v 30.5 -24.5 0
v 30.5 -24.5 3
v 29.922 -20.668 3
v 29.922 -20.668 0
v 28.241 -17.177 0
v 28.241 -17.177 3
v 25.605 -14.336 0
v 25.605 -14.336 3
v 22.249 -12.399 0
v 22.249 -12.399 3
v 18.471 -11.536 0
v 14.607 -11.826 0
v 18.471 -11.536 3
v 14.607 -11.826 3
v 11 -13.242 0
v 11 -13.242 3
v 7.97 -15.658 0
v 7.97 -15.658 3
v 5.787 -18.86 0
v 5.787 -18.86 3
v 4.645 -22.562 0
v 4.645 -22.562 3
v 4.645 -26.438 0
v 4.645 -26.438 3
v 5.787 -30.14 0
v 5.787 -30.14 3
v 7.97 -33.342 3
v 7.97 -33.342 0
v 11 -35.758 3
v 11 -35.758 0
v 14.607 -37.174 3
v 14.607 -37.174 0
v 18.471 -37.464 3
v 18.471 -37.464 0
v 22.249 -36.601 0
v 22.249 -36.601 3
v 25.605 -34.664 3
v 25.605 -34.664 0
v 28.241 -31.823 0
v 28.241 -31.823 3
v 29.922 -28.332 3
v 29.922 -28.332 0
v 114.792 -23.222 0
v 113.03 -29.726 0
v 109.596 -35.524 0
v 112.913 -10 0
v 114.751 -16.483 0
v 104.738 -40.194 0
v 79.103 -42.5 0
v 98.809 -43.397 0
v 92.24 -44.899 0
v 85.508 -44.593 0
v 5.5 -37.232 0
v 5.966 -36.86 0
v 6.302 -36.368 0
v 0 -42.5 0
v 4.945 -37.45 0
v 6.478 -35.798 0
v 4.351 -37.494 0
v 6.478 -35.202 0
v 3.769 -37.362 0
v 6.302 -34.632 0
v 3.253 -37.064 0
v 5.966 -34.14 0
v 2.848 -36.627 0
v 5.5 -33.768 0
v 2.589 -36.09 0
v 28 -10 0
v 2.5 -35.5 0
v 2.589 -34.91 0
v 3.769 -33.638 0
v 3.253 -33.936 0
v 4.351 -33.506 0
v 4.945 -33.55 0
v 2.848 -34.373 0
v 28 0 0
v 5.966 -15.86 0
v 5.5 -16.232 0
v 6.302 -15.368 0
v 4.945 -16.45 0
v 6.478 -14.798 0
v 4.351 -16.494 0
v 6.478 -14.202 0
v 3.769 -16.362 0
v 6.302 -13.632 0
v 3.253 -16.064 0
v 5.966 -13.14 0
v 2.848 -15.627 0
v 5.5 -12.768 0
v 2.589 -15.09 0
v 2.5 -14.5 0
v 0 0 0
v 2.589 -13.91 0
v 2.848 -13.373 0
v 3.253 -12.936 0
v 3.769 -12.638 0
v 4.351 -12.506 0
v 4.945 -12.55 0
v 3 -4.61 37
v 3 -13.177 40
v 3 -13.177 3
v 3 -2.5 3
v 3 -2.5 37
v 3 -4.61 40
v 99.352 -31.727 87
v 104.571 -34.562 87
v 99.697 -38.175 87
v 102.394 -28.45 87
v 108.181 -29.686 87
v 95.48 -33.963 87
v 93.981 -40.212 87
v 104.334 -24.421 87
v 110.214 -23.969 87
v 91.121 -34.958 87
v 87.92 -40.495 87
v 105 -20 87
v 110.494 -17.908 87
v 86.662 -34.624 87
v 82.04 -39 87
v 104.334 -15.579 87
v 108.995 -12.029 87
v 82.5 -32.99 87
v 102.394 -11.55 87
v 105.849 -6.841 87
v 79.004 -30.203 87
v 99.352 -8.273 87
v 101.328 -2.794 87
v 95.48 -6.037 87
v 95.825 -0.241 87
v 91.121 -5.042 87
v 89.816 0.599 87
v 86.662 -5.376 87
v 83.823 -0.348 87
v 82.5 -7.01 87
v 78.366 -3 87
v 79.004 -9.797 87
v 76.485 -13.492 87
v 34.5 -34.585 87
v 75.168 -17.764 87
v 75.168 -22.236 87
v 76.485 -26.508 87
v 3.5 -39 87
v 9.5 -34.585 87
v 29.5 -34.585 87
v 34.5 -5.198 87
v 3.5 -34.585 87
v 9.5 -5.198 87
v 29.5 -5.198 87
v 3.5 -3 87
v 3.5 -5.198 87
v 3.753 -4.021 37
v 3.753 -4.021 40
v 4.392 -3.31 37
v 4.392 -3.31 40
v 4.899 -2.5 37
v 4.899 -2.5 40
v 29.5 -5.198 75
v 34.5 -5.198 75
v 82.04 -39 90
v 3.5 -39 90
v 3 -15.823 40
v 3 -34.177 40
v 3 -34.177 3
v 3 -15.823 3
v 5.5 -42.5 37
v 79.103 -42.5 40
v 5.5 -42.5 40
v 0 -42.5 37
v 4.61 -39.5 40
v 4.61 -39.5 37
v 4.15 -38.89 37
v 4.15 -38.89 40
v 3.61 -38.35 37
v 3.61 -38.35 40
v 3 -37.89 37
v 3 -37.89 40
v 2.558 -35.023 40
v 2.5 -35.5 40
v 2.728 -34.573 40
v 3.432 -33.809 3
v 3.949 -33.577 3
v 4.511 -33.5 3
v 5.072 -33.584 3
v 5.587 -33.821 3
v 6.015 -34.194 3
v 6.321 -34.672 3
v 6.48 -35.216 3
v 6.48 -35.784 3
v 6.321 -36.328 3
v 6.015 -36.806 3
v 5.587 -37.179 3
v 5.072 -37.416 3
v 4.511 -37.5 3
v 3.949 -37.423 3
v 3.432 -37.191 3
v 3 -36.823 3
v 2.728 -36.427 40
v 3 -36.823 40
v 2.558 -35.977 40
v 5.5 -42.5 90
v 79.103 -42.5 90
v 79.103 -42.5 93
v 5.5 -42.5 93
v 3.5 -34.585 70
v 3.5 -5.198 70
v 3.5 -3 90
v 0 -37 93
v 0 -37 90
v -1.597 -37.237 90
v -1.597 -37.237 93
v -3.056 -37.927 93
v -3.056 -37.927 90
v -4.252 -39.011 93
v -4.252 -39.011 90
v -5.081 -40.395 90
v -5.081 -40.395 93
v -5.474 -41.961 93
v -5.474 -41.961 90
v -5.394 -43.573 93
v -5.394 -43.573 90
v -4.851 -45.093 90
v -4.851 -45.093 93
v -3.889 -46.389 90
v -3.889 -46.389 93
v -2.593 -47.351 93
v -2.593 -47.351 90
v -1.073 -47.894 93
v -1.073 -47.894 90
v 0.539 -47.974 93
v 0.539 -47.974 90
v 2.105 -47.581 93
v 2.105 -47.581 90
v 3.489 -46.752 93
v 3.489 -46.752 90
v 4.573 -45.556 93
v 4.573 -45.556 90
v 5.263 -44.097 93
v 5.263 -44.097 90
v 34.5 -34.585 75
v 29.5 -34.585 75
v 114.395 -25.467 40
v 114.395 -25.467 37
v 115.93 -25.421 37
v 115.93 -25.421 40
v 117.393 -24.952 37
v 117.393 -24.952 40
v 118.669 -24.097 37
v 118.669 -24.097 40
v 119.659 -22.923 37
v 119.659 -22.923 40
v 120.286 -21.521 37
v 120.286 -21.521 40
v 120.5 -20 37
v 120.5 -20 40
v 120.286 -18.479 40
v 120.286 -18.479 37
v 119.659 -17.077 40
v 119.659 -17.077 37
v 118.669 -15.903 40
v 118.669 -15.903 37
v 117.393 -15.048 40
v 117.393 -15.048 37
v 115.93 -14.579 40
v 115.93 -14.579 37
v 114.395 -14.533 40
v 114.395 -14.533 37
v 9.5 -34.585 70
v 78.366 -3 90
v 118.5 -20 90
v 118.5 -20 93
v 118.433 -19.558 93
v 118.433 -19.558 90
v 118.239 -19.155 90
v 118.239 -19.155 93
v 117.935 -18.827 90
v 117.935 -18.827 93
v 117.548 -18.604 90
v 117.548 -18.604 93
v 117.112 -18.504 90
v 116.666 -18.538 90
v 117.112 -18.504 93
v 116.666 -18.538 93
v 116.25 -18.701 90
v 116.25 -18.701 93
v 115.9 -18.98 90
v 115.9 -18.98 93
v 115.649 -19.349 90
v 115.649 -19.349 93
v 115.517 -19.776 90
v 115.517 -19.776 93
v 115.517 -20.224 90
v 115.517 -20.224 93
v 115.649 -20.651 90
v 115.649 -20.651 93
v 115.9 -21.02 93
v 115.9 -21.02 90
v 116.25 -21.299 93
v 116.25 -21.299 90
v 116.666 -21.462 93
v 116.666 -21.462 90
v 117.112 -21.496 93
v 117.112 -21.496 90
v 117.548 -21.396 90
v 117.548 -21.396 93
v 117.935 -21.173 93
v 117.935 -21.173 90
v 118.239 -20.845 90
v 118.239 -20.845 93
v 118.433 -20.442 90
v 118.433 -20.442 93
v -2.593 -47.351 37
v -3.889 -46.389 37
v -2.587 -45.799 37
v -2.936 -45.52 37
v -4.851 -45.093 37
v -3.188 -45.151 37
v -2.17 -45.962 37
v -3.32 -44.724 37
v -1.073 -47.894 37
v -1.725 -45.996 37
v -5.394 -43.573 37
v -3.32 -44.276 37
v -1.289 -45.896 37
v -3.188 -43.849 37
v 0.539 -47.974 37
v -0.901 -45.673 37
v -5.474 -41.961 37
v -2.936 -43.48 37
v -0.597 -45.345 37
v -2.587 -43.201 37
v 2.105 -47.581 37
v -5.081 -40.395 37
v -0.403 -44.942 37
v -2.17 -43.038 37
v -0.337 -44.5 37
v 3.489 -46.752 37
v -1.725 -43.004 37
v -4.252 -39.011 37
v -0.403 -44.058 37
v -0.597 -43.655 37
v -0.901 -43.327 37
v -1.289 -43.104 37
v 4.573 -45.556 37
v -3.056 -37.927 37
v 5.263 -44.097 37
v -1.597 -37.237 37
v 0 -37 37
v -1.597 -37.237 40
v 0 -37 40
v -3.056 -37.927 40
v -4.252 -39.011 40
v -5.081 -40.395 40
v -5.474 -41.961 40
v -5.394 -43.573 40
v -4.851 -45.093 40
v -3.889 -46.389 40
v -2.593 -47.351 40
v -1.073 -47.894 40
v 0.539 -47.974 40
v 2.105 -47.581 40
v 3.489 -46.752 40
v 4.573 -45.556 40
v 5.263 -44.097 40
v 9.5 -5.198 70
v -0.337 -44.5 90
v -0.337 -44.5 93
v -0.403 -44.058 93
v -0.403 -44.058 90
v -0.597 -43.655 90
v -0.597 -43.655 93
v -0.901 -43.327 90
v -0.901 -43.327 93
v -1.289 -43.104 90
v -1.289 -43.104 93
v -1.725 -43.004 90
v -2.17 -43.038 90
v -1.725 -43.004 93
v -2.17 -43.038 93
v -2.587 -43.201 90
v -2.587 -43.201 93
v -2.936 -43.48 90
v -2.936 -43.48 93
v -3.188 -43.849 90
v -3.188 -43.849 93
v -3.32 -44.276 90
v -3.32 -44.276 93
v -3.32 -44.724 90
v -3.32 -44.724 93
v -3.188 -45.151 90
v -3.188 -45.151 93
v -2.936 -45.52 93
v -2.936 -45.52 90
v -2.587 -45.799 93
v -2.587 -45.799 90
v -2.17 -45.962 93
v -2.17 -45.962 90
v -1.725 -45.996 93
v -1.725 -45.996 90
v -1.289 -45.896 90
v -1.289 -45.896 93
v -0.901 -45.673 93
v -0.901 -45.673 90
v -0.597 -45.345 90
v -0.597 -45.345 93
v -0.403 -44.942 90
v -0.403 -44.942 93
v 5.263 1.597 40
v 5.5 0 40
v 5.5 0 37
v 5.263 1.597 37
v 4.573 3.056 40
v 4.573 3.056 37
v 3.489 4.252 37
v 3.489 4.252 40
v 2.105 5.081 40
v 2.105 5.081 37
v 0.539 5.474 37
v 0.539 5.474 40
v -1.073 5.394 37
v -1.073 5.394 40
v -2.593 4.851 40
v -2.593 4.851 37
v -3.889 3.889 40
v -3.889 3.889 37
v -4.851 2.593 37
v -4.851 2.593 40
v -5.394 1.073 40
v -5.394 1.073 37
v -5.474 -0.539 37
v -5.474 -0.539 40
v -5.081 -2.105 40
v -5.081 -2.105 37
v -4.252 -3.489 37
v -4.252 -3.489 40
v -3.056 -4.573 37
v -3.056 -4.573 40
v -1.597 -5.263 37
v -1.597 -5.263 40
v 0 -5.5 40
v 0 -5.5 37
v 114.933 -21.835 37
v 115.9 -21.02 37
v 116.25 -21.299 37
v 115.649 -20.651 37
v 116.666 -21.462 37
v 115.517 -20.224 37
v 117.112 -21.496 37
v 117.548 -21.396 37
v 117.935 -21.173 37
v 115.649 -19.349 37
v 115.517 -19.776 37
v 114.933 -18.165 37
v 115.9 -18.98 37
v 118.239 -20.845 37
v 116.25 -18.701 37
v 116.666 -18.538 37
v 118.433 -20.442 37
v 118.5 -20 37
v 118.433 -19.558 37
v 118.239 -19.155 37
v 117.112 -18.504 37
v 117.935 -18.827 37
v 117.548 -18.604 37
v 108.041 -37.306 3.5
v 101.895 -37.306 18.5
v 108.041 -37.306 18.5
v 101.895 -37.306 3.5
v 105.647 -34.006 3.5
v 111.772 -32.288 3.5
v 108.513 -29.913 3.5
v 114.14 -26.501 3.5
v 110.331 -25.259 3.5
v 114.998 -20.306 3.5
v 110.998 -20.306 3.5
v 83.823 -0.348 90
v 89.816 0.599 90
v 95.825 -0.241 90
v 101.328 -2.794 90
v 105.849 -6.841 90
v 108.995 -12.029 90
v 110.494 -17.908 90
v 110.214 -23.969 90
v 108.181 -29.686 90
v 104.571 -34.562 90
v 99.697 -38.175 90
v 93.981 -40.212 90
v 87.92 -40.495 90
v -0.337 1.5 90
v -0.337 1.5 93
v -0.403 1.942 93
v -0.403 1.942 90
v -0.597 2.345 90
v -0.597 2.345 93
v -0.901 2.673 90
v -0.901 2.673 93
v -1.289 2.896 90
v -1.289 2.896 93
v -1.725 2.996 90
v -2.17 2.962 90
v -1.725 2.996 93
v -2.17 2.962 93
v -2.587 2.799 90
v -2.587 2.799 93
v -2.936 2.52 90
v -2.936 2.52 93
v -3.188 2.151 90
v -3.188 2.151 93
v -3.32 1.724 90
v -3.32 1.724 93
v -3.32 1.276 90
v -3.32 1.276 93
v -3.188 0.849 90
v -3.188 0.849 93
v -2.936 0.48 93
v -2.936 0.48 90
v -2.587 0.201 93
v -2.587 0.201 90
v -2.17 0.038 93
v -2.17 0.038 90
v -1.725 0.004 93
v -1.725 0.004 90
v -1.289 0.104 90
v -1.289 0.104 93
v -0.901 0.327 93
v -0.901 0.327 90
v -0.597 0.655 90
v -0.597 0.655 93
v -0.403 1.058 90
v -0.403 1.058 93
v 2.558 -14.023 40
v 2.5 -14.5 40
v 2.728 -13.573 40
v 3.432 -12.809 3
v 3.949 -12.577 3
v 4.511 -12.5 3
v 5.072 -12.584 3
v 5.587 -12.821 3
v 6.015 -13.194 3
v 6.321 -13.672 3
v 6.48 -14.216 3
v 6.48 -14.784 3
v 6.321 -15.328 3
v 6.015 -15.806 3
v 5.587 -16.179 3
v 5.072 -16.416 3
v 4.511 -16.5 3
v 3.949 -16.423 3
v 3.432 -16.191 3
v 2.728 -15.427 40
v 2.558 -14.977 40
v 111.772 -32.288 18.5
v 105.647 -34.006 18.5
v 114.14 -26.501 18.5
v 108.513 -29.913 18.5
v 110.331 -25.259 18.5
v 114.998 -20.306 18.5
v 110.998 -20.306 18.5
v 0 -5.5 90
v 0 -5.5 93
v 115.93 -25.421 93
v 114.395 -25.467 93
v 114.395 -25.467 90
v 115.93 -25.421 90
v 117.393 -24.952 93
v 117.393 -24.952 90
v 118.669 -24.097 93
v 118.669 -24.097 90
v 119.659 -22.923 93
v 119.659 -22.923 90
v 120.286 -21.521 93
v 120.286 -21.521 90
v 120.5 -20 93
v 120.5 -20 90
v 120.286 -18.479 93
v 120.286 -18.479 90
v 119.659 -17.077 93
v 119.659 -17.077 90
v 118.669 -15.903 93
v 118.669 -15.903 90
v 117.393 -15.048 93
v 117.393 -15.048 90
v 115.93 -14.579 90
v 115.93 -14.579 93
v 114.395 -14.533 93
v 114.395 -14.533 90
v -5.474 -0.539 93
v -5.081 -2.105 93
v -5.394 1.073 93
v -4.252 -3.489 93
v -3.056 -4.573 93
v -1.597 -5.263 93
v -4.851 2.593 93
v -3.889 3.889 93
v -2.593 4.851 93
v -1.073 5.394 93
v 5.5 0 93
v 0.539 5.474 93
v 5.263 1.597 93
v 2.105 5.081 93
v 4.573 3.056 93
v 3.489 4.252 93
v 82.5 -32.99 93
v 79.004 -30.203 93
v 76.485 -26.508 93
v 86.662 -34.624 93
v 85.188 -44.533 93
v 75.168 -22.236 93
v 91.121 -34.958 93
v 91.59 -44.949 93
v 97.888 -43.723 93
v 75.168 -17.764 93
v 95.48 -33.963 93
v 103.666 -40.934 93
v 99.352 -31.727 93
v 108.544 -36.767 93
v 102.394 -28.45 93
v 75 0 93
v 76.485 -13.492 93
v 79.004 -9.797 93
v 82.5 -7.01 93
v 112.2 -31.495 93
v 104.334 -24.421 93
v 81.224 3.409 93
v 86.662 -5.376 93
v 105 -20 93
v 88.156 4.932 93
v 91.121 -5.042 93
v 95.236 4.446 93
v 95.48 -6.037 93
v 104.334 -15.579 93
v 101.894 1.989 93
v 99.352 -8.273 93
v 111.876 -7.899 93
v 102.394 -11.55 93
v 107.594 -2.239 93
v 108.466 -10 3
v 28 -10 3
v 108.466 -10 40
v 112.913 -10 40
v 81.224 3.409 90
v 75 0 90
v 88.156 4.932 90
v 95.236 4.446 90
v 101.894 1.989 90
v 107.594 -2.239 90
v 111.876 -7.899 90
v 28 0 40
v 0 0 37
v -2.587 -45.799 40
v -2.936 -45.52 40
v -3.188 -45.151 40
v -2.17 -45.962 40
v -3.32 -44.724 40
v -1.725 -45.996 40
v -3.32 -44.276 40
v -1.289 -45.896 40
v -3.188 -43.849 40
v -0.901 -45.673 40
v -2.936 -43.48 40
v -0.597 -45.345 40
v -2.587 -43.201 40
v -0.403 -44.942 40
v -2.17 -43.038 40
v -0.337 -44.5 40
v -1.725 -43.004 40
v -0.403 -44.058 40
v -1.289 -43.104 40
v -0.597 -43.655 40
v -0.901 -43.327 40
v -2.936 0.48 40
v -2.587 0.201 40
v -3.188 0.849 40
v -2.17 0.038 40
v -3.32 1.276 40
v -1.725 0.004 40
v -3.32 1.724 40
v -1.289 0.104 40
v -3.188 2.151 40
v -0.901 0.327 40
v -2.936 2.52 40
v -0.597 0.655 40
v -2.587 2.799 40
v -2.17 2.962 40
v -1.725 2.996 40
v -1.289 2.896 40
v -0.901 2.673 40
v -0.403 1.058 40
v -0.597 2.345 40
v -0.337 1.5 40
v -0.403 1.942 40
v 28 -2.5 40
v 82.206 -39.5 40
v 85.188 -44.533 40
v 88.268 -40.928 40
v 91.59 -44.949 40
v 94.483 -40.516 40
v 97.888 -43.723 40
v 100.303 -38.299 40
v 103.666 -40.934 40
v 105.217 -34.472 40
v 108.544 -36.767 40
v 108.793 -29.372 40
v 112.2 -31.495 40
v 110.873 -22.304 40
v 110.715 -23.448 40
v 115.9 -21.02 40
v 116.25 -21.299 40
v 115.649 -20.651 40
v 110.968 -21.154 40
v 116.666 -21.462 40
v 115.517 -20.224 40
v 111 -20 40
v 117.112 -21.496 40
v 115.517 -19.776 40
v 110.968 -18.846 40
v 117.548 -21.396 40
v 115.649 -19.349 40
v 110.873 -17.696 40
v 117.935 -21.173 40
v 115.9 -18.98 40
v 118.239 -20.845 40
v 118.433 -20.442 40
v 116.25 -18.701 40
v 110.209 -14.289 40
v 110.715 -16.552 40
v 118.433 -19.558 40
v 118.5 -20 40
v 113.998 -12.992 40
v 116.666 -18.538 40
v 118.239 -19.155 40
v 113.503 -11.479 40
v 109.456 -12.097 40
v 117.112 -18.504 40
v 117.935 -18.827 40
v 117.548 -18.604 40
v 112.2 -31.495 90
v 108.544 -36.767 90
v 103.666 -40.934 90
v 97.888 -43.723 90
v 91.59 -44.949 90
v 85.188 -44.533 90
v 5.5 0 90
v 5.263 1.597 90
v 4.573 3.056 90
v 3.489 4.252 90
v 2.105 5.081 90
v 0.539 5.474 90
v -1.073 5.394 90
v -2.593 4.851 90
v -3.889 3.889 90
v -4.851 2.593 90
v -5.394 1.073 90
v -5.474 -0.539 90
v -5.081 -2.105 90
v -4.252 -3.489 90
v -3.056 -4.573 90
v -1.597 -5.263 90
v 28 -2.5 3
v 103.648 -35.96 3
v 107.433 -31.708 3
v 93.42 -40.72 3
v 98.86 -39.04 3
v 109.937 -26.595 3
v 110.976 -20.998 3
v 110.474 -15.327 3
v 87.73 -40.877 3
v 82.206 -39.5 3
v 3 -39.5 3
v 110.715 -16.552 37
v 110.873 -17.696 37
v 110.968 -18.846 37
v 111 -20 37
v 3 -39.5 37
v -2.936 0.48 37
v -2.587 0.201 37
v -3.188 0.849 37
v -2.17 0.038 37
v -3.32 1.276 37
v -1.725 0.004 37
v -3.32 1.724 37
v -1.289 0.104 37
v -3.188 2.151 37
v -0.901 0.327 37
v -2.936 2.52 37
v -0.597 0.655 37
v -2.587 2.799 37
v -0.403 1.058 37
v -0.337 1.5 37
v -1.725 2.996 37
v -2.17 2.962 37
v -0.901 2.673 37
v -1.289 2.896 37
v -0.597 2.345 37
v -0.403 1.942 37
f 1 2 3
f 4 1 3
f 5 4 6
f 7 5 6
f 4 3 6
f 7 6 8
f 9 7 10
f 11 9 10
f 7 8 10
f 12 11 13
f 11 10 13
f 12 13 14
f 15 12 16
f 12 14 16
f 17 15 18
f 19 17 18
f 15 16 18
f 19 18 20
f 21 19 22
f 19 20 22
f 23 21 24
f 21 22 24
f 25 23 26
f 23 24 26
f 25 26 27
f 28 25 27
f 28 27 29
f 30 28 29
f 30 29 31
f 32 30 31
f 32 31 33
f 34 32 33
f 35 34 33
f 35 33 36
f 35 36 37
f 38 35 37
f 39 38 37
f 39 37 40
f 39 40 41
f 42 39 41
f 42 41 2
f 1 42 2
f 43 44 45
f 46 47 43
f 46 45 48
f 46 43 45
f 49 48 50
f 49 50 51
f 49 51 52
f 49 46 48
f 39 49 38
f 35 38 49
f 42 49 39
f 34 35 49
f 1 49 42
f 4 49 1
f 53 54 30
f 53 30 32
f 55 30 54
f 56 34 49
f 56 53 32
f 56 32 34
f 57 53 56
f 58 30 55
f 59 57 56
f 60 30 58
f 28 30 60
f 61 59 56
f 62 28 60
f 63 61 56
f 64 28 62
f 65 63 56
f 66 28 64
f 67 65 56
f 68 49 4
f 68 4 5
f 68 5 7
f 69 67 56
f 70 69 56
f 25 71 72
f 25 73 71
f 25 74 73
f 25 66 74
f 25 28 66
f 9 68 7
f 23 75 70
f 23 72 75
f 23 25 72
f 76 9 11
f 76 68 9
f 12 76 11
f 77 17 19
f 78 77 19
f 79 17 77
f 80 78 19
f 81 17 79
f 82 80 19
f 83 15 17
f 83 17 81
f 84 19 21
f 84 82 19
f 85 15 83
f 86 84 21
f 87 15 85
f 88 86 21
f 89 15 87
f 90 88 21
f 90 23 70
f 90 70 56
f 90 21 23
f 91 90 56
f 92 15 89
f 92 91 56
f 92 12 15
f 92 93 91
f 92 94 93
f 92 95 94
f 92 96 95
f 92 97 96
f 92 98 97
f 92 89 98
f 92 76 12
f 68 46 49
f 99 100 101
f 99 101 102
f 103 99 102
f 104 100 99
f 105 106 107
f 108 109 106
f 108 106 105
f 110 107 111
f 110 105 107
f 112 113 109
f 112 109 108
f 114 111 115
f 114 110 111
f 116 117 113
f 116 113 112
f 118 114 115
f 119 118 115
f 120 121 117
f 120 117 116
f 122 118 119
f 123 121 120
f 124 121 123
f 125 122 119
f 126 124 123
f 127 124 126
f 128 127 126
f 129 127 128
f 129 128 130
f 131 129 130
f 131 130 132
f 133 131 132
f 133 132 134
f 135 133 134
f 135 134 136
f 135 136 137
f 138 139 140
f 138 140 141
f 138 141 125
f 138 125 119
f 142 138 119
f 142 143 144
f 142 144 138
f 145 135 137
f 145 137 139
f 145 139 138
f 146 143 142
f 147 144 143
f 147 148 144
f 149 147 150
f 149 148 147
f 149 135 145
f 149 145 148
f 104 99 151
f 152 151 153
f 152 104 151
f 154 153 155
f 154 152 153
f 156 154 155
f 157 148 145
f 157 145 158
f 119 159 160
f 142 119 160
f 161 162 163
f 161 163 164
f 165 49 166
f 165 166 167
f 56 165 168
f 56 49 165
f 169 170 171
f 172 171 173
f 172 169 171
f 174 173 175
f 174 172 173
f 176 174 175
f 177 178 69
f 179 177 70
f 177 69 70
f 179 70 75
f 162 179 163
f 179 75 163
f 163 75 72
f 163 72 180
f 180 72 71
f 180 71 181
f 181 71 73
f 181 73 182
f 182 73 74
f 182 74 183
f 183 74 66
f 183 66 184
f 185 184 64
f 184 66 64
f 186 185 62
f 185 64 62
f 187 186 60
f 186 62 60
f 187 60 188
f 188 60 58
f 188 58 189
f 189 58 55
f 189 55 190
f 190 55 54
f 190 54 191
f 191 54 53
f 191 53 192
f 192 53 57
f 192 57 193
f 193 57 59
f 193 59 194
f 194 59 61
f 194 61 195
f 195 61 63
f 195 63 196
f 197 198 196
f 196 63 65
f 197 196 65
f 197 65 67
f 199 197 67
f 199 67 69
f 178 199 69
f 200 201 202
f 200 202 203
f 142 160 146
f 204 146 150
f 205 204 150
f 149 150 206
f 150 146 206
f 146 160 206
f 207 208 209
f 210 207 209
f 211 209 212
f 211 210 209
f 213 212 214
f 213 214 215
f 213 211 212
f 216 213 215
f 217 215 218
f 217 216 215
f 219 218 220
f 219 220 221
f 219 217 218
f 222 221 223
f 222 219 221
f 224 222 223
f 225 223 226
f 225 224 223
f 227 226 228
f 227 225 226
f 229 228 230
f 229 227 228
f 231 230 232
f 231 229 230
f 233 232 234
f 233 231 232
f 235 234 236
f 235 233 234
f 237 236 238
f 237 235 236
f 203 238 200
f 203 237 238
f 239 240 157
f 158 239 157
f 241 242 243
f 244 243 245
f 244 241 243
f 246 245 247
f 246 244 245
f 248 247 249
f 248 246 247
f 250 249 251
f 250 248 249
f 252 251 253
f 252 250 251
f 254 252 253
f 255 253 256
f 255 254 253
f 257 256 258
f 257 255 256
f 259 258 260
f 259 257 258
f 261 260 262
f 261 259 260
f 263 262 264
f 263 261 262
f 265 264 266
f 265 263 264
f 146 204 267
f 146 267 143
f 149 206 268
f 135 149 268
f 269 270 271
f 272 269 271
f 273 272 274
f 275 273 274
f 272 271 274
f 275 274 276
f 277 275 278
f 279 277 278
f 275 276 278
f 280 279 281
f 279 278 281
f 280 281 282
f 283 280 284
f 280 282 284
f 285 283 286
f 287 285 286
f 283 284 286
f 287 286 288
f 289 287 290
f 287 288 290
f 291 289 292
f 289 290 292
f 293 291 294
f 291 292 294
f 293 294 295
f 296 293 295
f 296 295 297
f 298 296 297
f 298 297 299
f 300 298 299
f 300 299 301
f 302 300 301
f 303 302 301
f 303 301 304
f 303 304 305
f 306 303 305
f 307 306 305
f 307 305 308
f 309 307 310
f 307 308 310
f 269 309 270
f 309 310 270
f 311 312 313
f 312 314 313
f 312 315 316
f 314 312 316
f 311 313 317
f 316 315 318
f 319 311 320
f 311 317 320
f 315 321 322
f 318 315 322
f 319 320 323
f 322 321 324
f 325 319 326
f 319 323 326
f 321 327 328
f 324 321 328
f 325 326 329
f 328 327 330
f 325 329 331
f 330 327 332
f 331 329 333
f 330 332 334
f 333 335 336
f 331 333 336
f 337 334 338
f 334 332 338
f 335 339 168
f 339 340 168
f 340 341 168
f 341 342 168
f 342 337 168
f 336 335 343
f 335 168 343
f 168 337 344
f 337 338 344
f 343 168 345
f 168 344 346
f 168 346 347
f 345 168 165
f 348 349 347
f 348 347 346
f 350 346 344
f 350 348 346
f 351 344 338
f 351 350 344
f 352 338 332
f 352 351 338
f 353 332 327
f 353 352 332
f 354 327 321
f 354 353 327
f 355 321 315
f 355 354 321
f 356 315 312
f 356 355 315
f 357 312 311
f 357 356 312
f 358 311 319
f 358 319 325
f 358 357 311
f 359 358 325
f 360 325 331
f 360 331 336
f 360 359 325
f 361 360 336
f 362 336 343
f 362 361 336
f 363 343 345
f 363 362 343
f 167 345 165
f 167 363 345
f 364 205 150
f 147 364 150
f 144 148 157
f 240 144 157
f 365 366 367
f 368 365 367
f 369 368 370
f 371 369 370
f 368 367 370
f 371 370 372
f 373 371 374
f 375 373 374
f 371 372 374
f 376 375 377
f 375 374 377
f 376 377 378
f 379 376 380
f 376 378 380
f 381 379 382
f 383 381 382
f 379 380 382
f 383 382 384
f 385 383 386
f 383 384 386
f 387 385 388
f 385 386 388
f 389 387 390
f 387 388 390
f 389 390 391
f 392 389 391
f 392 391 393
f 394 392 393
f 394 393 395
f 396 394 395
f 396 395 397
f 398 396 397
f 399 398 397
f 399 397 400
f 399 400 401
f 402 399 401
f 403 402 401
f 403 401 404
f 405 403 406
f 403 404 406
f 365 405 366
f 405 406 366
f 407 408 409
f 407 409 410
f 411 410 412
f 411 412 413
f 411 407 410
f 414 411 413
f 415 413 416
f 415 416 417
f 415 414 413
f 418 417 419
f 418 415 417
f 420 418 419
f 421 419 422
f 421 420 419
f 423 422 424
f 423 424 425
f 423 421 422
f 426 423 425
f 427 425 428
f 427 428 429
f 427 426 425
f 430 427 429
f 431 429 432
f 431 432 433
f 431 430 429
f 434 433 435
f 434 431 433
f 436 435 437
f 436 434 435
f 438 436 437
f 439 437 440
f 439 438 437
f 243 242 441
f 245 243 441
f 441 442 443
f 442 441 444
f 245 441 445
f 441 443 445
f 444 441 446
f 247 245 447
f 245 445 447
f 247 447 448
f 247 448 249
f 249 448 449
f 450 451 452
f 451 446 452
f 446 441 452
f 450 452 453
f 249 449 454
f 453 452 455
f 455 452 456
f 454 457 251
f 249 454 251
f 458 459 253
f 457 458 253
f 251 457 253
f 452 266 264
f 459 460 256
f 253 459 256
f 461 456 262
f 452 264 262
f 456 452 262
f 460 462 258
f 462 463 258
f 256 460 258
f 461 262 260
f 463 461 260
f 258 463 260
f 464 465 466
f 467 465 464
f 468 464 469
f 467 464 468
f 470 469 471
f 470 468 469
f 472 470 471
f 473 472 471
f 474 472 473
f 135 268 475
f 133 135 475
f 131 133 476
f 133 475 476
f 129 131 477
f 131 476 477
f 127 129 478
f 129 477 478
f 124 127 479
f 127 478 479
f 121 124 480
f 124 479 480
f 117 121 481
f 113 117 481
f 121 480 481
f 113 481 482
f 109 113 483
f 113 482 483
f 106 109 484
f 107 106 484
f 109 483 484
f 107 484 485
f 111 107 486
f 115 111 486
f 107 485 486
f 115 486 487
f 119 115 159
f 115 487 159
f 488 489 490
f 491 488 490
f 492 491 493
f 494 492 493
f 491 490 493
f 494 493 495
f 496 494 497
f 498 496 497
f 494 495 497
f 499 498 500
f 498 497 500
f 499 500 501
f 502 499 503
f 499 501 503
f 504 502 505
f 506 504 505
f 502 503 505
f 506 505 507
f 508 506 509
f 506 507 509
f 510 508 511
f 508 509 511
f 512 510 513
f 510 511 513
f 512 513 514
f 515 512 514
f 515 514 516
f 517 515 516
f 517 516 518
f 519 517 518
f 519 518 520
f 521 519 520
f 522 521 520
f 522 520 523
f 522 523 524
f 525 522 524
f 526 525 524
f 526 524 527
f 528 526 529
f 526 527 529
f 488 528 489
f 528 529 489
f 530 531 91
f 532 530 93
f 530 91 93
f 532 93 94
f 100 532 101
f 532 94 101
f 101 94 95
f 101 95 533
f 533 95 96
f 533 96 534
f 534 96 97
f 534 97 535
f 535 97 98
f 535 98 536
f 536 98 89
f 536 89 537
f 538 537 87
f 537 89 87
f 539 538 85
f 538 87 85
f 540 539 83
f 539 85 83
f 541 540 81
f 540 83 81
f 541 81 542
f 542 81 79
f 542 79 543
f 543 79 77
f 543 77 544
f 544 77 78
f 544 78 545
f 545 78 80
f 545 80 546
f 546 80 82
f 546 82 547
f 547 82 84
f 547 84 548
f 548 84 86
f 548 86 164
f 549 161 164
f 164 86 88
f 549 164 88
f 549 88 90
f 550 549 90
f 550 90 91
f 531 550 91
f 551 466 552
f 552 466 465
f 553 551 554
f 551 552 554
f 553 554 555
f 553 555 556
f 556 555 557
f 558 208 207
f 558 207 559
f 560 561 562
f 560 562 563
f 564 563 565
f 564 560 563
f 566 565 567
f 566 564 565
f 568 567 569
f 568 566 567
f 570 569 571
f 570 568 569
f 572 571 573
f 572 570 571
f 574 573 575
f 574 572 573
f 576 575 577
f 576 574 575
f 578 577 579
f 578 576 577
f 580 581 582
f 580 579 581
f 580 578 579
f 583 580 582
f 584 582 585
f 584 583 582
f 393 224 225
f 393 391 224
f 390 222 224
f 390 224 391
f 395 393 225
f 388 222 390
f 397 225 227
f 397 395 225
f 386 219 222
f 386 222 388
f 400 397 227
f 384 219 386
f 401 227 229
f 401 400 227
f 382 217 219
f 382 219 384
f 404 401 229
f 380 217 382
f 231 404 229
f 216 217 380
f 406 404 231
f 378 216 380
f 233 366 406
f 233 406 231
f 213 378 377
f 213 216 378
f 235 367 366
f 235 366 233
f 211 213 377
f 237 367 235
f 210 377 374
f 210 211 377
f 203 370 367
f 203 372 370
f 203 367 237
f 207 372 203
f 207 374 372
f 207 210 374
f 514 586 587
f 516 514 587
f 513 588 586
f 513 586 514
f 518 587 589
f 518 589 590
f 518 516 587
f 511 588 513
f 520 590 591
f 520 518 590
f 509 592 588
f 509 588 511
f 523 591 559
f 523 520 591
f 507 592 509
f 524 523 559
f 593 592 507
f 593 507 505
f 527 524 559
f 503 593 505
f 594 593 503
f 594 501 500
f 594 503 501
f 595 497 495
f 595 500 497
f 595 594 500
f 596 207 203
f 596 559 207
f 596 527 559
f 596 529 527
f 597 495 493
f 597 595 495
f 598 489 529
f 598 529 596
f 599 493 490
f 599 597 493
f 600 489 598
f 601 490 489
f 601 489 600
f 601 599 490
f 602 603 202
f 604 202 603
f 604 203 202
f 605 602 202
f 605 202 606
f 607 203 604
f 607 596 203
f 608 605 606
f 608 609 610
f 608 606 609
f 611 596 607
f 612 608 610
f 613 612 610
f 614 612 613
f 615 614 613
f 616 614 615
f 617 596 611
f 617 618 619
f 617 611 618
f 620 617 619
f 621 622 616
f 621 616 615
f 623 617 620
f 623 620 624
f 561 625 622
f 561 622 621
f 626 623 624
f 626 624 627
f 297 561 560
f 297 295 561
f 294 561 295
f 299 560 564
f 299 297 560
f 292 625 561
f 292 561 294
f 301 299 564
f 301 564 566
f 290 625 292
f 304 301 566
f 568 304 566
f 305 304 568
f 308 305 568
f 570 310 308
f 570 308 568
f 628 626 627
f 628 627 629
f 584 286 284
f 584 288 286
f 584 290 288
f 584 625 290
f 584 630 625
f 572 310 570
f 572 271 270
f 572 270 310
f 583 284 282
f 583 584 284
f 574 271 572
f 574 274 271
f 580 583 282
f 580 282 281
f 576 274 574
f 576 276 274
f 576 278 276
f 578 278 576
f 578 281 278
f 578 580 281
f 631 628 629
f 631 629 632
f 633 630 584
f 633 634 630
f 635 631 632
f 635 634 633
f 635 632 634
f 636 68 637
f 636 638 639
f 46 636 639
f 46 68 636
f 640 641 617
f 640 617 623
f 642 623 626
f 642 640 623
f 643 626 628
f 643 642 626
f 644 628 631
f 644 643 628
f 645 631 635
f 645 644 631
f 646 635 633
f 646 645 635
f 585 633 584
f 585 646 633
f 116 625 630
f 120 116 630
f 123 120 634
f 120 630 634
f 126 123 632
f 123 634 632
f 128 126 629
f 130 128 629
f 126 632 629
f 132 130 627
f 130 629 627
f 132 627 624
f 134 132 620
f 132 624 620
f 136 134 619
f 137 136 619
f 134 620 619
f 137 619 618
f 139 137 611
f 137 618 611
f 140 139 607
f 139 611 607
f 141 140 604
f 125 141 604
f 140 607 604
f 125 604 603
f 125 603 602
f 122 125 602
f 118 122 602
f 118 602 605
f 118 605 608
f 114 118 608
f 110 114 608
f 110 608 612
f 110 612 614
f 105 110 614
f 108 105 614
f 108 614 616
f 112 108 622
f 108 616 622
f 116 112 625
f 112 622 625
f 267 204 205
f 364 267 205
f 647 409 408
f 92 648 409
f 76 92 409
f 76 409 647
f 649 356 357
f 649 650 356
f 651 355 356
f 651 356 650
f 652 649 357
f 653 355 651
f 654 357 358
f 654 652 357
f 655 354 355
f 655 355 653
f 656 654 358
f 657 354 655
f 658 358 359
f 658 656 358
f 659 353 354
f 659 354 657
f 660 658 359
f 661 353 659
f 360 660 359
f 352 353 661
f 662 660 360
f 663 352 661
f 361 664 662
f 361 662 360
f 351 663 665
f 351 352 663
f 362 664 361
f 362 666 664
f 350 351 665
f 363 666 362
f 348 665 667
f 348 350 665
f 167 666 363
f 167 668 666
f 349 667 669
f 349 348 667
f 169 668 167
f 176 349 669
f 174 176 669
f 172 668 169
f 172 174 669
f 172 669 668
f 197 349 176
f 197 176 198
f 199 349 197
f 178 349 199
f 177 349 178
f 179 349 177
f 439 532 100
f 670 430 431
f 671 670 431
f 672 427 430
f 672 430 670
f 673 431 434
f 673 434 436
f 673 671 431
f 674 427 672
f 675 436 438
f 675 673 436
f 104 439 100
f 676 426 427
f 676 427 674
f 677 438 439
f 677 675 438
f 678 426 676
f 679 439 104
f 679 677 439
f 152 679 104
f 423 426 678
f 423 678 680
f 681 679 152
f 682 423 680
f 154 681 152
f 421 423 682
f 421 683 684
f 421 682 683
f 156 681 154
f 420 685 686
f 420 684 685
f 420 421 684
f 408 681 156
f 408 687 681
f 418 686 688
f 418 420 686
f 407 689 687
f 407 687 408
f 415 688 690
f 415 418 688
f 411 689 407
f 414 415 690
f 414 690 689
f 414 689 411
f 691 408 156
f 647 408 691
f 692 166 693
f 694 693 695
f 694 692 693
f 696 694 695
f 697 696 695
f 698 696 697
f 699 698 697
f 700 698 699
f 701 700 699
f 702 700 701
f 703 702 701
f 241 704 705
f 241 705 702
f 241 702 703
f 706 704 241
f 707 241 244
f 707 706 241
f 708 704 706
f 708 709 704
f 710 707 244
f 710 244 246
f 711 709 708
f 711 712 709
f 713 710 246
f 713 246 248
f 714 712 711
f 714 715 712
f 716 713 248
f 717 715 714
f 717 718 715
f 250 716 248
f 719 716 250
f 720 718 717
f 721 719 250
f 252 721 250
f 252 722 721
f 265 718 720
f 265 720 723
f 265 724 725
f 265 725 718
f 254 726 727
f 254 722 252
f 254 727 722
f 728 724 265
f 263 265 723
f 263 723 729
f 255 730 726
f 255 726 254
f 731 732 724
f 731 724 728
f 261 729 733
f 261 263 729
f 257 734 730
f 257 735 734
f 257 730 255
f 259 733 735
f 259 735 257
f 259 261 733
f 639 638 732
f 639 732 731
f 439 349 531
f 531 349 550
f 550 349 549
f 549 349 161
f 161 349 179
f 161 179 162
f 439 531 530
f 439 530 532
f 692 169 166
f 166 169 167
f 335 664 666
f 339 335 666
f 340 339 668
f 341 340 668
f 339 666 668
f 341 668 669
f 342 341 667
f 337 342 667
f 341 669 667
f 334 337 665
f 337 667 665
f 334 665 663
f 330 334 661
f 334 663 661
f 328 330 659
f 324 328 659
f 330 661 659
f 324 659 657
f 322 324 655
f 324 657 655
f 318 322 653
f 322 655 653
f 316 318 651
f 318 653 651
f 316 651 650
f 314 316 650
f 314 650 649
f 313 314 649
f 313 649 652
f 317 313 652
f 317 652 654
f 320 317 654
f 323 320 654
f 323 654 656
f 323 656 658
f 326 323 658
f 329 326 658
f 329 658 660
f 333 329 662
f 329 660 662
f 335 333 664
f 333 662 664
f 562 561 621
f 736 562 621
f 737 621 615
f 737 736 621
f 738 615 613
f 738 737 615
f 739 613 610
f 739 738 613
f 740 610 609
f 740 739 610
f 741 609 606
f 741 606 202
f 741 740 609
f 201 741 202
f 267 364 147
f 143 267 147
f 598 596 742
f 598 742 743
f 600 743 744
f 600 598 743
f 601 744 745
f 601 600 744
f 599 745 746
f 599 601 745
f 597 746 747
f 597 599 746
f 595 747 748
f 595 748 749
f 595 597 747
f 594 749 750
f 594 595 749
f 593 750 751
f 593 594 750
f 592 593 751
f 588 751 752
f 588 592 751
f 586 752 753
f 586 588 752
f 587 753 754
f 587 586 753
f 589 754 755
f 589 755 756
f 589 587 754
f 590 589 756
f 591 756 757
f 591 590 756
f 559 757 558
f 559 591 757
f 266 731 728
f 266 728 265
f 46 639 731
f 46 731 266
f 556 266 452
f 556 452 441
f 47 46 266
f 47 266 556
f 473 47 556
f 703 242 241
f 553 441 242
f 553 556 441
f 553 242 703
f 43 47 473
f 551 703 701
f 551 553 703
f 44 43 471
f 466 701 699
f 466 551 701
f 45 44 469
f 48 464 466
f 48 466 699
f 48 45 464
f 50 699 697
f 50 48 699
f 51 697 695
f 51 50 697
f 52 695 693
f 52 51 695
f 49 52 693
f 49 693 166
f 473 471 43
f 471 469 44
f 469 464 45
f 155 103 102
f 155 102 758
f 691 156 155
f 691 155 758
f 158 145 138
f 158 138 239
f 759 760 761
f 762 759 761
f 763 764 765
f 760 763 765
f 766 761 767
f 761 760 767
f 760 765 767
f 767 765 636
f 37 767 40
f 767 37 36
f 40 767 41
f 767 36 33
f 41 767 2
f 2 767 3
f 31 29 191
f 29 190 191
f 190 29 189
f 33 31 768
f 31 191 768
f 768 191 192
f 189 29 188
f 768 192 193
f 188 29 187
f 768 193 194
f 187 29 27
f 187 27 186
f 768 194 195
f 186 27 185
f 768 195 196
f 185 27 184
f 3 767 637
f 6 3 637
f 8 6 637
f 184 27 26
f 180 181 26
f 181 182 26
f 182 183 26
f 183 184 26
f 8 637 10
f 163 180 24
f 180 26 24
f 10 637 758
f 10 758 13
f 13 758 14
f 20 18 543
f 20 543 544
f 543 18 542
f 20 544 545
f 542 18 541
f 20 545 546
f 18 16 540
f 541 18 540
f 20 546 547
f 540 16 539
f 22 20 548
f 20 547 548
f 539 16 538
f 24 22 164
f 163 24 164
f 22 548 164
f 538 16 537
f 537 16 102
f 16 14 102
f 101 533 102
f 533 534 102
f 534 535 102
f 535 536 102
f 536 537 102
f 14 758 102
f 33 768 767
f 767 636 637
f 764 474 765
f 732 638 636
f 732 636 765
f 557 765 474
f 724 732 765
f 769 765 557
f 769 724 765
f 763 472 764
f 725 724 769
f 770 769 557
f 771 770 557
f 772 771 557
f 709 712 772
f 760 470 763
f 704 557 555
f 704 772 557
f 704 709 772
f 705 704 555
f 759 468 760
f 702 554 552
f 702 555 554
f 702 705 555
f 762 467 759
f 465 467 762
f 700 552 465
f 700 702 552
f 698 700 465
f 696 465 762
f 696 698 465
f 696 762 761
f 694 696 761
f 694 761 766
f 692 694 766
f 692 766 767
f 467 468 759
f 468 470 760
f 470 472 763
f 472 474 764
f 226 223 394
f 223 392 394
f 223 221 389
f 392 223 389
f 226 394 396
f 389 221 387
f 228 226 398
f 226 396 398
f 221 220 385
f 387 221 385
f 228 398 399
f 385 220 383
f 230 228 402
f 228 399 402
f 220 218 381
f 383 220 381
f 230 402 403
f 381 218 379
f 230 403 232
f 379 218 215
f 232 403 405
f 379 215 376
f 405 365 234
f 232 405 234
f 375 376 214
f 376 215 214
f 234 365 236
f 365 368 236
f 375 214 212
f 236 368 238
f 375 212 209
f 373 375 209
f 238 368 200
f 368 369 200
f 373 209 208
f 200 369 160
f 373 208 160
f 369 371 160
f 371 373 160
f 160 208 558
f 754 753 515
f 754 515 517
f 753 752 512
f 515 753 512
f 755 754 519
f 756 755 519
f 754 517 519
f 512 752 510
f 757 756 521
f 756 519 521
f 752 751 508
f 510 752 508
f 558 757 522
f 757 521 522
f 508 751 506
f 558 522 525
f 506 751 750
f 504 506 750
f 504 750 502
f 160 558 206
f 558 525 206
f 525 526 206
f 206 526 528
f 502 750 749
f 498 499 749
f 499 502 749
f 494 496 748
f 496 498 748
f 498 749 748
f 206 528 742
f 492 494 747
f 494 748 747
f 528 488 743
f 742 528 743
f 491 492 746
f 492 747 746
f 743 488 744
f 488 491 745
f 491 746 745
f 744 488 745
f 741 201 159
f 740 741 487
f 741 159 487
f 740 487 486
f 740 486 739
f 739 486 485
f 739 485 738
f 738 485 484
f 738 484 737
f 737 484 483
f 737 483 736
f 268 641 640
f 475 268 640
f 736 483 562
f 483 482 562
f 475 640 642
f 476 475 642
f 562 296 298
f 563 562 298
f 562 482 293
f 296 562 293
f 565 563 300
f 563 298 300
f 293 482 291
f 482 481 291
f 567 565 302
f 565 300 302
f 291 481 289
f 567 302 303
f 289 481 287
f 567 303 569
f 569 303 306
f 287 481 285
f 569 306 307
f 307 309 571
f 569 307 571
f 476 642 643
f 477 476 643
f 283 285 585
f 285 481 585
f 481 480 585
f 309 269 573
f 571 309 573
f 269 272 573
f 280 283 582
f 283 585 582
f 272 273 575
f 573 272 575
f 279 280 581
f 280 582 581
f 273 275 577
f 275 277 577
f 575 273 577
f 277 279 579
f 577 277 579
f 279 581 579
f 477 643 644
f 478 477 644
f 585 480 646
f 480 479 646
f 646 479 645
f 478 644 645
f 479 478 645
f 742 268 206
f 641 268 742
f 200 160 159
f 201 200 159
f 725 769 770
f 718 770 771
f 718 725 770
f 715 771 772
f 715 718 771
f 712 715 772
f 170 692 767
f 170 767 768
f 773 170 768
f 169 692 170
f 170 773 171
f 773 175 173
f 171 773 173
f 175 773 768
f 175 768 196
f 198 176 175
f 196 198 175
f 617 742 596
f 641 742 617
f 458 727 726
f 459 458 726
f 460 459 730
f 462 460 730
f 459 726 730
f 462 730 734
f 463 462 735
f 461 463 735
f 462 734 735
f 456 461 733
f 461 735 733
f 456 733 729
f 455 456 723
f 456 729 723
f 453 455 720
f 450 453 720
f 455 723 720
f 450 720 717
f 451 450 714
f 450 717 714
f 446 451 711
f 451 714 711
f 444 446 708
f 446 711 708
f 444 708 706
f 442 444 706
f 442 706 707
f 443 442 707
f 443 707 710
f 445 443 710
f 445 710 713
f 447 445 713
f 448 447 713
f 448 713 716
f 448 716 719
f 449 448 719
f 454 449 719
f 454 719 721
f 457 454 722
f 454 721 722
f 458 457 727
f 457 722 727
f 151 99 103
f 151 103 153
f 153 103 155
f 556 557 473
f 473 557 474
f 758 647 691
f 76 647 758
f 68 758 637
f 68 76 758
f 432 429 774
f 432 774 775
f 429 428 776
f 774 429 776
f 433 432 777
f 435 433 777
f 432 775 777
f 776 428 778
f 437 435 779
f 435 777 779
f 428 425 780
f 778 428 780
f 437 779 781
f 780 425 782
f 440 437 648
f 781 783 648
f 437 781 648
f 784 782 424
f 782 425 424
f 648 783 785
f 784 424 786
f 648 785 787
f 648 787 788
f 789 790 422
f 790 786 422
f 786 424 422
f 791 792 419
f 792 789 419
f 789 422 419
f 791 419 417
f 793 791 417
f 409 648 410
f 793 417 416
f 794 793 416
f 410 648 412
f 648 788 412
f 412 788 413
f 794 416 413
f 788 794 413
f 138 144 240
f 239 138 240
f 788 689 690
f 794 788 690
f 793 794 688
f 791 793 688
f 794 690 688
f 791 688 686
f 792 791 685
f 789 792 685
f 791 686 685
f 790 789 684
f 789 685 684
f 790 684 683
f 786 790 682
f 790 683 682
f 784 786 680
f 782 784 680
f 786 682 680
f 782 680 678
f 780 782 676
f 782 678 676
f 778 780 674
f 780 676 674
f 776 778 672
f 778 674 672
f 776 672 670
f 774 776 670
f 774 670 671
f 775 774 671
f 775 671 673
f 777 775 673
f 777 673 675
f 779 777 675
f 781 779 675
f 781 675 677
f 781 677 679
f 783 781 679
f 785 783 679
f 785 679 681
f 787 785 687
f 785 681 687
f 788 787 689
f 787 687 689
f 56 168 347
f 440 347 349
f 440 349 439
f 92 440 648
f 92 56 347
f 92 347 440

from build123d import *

# Parameters (mm, degrees)
BOSS_EXTRUDE1_DEPTH = 40
CUT_EXTRUDE1_DEPTH  = 37
CUT_EXTRUDE7_REACH  = 131.808
SKETCH4_R           = 13
CUT_EXTRUDE4_DEPTH  = 20
SKETCH14_W          = 15
SKETCH14_H          = 17
CUT_EXTRUDE12_DEPTH = 128.157382798
BOSS_EXTRUDE2_DEPTH = 3
BOSS_EXTRUDE3_DEPTH = 6
SKETCH18_W          = 17
SKETCH18_H          = 29.386957978
BOSS_EXTRUDE4_DEPTH = 6
SKETCH19_R          = 15
CUT_EXTRUDE13_DEPTH = 6
SKETCH20_R          = 5.5
SKETCH20_R_2        = 1.5
BOSS_EXTRUDE5_DEPTH = 3
SKETCH21_R          = 5.5
SKETCH21_R_2        = 1.5
BOSS_EXTRUDE6_DEPTH = 3
CUT_EXTRUDE14_START = 66
SKETCH22_R          = 21
CUT_EXTRUDE14_DEPTH = 66
SKETCH23_R          = 2
CUT_EXTRUDE15_DEPTH = 40
BOSS_EXTRUDE7_START = 20
SKETCH24_W          = 12
SKETCH24_H          = 29.386957978
BOSS_EXTRUDE7_DEPTH = 5


with BuildPart() as part:
    # Sketch1 → Boss-Extrude1 (new body)
    with BuildSketch(Plane.XY):
        with BuildLine():
            Line((0, 0), (75, 0))
            ThreePointArc((75, 0), (114.884319464, -17.597783355), (79.102752641, -42.5))
            Line((79.102752641, -42.5), (0, -42.5))
            Line((0, -42.5), (0, 0))
        make_face()
    extrude(amount=BOSS_EXTRUDE1_DEPTH)

    # Sketch2 → Cut-Extrude1 (cut)
    with BuildSketch(Plane.XY.offset(40)):
        with BuildLine():
            Line((3, -2.5), (78.391813234, -2.5))
            ThreePointArc((78.391813234, -2.5), (110.889313795, -17.846730588), (82.205771366, -39.5))
            Line((82.205771366, -39.5), (3, -39.5))
            Line((3, -39.5), (3, -2.5))
        make_face()
    extrude(amount=-CUT_EXTRUDE1_DEPTH, mode=Mode.SUBTRACT)

    # Sketch8 → Cut-Extrude7 (cut, up to next)
    with BuildSketch(Plane(origin=(0, 0, 0), x_dir=(-1, 0, 0), z_dir=(0, 0, -1)), mode=Mode.PRIVATE) as cut_extrude7_sk1:
        Polygon((-66.329094804, 0), (-28, 0), (-28, -10), (-118, -10), (-118, 0), (-118, 13.355508048), (-66.329094804, 13.355508048), align=None)
    cut_extrude7_tool1 = extrude(cut_extrude7_sk1.sketch, amount=-CUT_EXTRUDE7_REACH, mode=Mode.PRIVATE) & part.part
    add(cut_extrude7_tool1.solids().sort_by_distance((81.317312, 0.068084, 0))[0], mode=Mode.SUBTRACT)

    # Sketch4 → Cut-Extrude4 (cut)
    with BuildSketch(Plane.XY.offset(3)):
        with Locations((17.5, -24.5)):
            Circle(SKETCH4_R)
    extrude(amount=-CUT_EXTRUDE4_DEPTH, mode=Mode.SUBTRACT)

    # Sketch14 → Cut-Extrude12 (cut, through all)
    with BuildSketch(Plane(origin=(3, 0, 0), x_dir=(0, 0, -1), z_dir=(1, 0, 0))):
        with Locations((-11, -28.806469784)):
            Rectangle(SKETCH14_W, SKETCH14_H)
    extrude(amount=CUT_EXTRUDE12_DEPTH, mode=Mode.SUBTRACT)

    # Sketch21 → Boss-Extrude6 (add)
    # profile 1 of 3: a face of its own
    with BuildSketch(Plane.XY.offset(40)):
        Circle(SKETCH21_R)
        with Locations((-1.836686141, 1.5)):
            Circle(SKETCH21_R_2, mode=Mode.SUBTRACT)
    # profile 2 of 3: a face of its own
    with BuildSketch(Plane.XY.offset(40)):
        with Locations((0, -42.5)):
            Circle(SKETCH21_R)
        with Locations((-1.836686141, -44.5)):
            Circle(SKETCH21_R_2, mode=Mode.SUBTRACT)
    # profile 3 of 3: a face of its own
    with BuildSketch(Plane.XY.offset(40)):
        with Locations((115, -20)):
            Circle(SKETCH21_R)
        with Locations((117, -20)):
            Circle(SKETCH21_R_2, mode=Mode.SUBTRACT)
    extrude(amount=-BOSS_EXTRUDE6_DEPTH)

    # Sketch22 → Cut-Extrude14 (cut)
    with BuildSketch(Plane.XY.offset(3).offset(CUT_EXTRUDE14_START)):
        with Locations((90, -20)):
            Circle(SKETCH22_R)
    extrude(amount=-CUT_EXTRUDE14_DEPTH, mode=Mode.SUBTRACT)

    # Sketch23 → Cut-Extrude15 (cut)
    with BuildSketch(Plane(origin=(0, 0, 0), x_dir=(-1, 0, 0), z_dir=(0, 0, -1))):
        with Locations((-4.5, -35.5)):
            Circle(SKETCH23_R)
        with Locations((-4.5, -14.5)):
            Circle(SKETCH23_R)
    extrude(amount=-CUT_EXTRUDE15_DEPTH, mode=Mode.SUBTRACT)


with BuildPart() as body_2:
    # Sketch15 → Boss-Extrude2 (new body)
    with BuildSketch(Plane.XY.offset(90)):
        with BuildLine():
            Line((0, 0), (75, 0))
            ThreePointArc((75, 0), (114.884319464, -17.597783355), (79.102752641, -42.5))
            Line((79.102752641, -42.5), (0, -42.5))
            Line((0, -42.5), (0, 0))
        make_face()
    extrude(amount=BOSS_EXTRUDE2_DEPTH)

    # Sketch17 → Boss-Extrude3 (add)
    with BuildSketch(Plane.XY.offset(93)):
        with BuildLine():
            Line((3.5, -3), (78.365568342, -3))
            ThreePointArc((78.365568342, -3), (110.493522229, -17.908219263), (82.040100503, -39))
            Line((82.040100503, -39), (3.5, -39))
            Line((3.5, -39), (3.5, -3))
        make_face()
    extrude(amount=-BOSS_EXTRUDE3_DEPTH)

    # Sketch18 → Boss-Extrude4 (add)
    with BuildSketch(Plane.ZY.offset(-3.5)):
        with Locations((78.5, -19.891561041)):
            Rectangle(SKETCH18_W, SKETCH18_H)
    extrude(amount=-BOSS_EXTRUDE4_DEPTH)

    # Sketch19 → Cut-Extrude13 (cut)
    with BuildSketch(Plane.XY.offset(93)):
        with Locations((90, -20)):
            Circle(SKETCH19_R)
    extrude(amount=-CUT_EXTRUDE13_DEPTH, mode=Mode.SUBTRACT)

    # Sketch20 → Boss-Extrude5 (add)
    # profile 1 of 3: a face of its own
    with BuildSketch(Plane.XY.offset(93)):
        Circle(SKETCH20_R)
        with Locations((-1.836686141, 1.5)):
            Circle(SKETCH20_R_2, mode=Mode.SUBTRACT)
    # profile 2 of 3: a face of its own
    with BuildSketch(Plane.XY.offset(93)):
        with Locations((0, -42.5)):
            Circle(SKETCH20_R)
        with Locations((-1.836686141, -44.5)):
            Circle(SKETCH20_R_2, mode=Mode.SUBTRACT)
    # profile 3 of 3: a face of its own
    with BuildSketch(Plane.XY.offset(93)):
        with Locations((115, -20)):
            Circle(SKETCH20_R)
        with Locations((117, -20)):
            Circle(SKETCH20_R_2, mode=Mode.SUBTRACT)
    extrude(amount=-BOSS_EXTRUDE5_DEPTH)

    # Sketch24 → Boss-Extrude7 (add)
    with BuildSketch(Plane(origin=(9.5, 0, 0), x_dir=(0, 0, -1), z_dir=(1, 0, 0)).offset(BOSS_EXTRUDE7_START)):
        with Locations((-81, -19.891561041)):
            Rectangle(SKETCH24_W, SKETCH24_H)
    extrude(amount=BOSS_EXTRUDE7_DEPTH)


solid = Compound([part.part, body_2.part])
